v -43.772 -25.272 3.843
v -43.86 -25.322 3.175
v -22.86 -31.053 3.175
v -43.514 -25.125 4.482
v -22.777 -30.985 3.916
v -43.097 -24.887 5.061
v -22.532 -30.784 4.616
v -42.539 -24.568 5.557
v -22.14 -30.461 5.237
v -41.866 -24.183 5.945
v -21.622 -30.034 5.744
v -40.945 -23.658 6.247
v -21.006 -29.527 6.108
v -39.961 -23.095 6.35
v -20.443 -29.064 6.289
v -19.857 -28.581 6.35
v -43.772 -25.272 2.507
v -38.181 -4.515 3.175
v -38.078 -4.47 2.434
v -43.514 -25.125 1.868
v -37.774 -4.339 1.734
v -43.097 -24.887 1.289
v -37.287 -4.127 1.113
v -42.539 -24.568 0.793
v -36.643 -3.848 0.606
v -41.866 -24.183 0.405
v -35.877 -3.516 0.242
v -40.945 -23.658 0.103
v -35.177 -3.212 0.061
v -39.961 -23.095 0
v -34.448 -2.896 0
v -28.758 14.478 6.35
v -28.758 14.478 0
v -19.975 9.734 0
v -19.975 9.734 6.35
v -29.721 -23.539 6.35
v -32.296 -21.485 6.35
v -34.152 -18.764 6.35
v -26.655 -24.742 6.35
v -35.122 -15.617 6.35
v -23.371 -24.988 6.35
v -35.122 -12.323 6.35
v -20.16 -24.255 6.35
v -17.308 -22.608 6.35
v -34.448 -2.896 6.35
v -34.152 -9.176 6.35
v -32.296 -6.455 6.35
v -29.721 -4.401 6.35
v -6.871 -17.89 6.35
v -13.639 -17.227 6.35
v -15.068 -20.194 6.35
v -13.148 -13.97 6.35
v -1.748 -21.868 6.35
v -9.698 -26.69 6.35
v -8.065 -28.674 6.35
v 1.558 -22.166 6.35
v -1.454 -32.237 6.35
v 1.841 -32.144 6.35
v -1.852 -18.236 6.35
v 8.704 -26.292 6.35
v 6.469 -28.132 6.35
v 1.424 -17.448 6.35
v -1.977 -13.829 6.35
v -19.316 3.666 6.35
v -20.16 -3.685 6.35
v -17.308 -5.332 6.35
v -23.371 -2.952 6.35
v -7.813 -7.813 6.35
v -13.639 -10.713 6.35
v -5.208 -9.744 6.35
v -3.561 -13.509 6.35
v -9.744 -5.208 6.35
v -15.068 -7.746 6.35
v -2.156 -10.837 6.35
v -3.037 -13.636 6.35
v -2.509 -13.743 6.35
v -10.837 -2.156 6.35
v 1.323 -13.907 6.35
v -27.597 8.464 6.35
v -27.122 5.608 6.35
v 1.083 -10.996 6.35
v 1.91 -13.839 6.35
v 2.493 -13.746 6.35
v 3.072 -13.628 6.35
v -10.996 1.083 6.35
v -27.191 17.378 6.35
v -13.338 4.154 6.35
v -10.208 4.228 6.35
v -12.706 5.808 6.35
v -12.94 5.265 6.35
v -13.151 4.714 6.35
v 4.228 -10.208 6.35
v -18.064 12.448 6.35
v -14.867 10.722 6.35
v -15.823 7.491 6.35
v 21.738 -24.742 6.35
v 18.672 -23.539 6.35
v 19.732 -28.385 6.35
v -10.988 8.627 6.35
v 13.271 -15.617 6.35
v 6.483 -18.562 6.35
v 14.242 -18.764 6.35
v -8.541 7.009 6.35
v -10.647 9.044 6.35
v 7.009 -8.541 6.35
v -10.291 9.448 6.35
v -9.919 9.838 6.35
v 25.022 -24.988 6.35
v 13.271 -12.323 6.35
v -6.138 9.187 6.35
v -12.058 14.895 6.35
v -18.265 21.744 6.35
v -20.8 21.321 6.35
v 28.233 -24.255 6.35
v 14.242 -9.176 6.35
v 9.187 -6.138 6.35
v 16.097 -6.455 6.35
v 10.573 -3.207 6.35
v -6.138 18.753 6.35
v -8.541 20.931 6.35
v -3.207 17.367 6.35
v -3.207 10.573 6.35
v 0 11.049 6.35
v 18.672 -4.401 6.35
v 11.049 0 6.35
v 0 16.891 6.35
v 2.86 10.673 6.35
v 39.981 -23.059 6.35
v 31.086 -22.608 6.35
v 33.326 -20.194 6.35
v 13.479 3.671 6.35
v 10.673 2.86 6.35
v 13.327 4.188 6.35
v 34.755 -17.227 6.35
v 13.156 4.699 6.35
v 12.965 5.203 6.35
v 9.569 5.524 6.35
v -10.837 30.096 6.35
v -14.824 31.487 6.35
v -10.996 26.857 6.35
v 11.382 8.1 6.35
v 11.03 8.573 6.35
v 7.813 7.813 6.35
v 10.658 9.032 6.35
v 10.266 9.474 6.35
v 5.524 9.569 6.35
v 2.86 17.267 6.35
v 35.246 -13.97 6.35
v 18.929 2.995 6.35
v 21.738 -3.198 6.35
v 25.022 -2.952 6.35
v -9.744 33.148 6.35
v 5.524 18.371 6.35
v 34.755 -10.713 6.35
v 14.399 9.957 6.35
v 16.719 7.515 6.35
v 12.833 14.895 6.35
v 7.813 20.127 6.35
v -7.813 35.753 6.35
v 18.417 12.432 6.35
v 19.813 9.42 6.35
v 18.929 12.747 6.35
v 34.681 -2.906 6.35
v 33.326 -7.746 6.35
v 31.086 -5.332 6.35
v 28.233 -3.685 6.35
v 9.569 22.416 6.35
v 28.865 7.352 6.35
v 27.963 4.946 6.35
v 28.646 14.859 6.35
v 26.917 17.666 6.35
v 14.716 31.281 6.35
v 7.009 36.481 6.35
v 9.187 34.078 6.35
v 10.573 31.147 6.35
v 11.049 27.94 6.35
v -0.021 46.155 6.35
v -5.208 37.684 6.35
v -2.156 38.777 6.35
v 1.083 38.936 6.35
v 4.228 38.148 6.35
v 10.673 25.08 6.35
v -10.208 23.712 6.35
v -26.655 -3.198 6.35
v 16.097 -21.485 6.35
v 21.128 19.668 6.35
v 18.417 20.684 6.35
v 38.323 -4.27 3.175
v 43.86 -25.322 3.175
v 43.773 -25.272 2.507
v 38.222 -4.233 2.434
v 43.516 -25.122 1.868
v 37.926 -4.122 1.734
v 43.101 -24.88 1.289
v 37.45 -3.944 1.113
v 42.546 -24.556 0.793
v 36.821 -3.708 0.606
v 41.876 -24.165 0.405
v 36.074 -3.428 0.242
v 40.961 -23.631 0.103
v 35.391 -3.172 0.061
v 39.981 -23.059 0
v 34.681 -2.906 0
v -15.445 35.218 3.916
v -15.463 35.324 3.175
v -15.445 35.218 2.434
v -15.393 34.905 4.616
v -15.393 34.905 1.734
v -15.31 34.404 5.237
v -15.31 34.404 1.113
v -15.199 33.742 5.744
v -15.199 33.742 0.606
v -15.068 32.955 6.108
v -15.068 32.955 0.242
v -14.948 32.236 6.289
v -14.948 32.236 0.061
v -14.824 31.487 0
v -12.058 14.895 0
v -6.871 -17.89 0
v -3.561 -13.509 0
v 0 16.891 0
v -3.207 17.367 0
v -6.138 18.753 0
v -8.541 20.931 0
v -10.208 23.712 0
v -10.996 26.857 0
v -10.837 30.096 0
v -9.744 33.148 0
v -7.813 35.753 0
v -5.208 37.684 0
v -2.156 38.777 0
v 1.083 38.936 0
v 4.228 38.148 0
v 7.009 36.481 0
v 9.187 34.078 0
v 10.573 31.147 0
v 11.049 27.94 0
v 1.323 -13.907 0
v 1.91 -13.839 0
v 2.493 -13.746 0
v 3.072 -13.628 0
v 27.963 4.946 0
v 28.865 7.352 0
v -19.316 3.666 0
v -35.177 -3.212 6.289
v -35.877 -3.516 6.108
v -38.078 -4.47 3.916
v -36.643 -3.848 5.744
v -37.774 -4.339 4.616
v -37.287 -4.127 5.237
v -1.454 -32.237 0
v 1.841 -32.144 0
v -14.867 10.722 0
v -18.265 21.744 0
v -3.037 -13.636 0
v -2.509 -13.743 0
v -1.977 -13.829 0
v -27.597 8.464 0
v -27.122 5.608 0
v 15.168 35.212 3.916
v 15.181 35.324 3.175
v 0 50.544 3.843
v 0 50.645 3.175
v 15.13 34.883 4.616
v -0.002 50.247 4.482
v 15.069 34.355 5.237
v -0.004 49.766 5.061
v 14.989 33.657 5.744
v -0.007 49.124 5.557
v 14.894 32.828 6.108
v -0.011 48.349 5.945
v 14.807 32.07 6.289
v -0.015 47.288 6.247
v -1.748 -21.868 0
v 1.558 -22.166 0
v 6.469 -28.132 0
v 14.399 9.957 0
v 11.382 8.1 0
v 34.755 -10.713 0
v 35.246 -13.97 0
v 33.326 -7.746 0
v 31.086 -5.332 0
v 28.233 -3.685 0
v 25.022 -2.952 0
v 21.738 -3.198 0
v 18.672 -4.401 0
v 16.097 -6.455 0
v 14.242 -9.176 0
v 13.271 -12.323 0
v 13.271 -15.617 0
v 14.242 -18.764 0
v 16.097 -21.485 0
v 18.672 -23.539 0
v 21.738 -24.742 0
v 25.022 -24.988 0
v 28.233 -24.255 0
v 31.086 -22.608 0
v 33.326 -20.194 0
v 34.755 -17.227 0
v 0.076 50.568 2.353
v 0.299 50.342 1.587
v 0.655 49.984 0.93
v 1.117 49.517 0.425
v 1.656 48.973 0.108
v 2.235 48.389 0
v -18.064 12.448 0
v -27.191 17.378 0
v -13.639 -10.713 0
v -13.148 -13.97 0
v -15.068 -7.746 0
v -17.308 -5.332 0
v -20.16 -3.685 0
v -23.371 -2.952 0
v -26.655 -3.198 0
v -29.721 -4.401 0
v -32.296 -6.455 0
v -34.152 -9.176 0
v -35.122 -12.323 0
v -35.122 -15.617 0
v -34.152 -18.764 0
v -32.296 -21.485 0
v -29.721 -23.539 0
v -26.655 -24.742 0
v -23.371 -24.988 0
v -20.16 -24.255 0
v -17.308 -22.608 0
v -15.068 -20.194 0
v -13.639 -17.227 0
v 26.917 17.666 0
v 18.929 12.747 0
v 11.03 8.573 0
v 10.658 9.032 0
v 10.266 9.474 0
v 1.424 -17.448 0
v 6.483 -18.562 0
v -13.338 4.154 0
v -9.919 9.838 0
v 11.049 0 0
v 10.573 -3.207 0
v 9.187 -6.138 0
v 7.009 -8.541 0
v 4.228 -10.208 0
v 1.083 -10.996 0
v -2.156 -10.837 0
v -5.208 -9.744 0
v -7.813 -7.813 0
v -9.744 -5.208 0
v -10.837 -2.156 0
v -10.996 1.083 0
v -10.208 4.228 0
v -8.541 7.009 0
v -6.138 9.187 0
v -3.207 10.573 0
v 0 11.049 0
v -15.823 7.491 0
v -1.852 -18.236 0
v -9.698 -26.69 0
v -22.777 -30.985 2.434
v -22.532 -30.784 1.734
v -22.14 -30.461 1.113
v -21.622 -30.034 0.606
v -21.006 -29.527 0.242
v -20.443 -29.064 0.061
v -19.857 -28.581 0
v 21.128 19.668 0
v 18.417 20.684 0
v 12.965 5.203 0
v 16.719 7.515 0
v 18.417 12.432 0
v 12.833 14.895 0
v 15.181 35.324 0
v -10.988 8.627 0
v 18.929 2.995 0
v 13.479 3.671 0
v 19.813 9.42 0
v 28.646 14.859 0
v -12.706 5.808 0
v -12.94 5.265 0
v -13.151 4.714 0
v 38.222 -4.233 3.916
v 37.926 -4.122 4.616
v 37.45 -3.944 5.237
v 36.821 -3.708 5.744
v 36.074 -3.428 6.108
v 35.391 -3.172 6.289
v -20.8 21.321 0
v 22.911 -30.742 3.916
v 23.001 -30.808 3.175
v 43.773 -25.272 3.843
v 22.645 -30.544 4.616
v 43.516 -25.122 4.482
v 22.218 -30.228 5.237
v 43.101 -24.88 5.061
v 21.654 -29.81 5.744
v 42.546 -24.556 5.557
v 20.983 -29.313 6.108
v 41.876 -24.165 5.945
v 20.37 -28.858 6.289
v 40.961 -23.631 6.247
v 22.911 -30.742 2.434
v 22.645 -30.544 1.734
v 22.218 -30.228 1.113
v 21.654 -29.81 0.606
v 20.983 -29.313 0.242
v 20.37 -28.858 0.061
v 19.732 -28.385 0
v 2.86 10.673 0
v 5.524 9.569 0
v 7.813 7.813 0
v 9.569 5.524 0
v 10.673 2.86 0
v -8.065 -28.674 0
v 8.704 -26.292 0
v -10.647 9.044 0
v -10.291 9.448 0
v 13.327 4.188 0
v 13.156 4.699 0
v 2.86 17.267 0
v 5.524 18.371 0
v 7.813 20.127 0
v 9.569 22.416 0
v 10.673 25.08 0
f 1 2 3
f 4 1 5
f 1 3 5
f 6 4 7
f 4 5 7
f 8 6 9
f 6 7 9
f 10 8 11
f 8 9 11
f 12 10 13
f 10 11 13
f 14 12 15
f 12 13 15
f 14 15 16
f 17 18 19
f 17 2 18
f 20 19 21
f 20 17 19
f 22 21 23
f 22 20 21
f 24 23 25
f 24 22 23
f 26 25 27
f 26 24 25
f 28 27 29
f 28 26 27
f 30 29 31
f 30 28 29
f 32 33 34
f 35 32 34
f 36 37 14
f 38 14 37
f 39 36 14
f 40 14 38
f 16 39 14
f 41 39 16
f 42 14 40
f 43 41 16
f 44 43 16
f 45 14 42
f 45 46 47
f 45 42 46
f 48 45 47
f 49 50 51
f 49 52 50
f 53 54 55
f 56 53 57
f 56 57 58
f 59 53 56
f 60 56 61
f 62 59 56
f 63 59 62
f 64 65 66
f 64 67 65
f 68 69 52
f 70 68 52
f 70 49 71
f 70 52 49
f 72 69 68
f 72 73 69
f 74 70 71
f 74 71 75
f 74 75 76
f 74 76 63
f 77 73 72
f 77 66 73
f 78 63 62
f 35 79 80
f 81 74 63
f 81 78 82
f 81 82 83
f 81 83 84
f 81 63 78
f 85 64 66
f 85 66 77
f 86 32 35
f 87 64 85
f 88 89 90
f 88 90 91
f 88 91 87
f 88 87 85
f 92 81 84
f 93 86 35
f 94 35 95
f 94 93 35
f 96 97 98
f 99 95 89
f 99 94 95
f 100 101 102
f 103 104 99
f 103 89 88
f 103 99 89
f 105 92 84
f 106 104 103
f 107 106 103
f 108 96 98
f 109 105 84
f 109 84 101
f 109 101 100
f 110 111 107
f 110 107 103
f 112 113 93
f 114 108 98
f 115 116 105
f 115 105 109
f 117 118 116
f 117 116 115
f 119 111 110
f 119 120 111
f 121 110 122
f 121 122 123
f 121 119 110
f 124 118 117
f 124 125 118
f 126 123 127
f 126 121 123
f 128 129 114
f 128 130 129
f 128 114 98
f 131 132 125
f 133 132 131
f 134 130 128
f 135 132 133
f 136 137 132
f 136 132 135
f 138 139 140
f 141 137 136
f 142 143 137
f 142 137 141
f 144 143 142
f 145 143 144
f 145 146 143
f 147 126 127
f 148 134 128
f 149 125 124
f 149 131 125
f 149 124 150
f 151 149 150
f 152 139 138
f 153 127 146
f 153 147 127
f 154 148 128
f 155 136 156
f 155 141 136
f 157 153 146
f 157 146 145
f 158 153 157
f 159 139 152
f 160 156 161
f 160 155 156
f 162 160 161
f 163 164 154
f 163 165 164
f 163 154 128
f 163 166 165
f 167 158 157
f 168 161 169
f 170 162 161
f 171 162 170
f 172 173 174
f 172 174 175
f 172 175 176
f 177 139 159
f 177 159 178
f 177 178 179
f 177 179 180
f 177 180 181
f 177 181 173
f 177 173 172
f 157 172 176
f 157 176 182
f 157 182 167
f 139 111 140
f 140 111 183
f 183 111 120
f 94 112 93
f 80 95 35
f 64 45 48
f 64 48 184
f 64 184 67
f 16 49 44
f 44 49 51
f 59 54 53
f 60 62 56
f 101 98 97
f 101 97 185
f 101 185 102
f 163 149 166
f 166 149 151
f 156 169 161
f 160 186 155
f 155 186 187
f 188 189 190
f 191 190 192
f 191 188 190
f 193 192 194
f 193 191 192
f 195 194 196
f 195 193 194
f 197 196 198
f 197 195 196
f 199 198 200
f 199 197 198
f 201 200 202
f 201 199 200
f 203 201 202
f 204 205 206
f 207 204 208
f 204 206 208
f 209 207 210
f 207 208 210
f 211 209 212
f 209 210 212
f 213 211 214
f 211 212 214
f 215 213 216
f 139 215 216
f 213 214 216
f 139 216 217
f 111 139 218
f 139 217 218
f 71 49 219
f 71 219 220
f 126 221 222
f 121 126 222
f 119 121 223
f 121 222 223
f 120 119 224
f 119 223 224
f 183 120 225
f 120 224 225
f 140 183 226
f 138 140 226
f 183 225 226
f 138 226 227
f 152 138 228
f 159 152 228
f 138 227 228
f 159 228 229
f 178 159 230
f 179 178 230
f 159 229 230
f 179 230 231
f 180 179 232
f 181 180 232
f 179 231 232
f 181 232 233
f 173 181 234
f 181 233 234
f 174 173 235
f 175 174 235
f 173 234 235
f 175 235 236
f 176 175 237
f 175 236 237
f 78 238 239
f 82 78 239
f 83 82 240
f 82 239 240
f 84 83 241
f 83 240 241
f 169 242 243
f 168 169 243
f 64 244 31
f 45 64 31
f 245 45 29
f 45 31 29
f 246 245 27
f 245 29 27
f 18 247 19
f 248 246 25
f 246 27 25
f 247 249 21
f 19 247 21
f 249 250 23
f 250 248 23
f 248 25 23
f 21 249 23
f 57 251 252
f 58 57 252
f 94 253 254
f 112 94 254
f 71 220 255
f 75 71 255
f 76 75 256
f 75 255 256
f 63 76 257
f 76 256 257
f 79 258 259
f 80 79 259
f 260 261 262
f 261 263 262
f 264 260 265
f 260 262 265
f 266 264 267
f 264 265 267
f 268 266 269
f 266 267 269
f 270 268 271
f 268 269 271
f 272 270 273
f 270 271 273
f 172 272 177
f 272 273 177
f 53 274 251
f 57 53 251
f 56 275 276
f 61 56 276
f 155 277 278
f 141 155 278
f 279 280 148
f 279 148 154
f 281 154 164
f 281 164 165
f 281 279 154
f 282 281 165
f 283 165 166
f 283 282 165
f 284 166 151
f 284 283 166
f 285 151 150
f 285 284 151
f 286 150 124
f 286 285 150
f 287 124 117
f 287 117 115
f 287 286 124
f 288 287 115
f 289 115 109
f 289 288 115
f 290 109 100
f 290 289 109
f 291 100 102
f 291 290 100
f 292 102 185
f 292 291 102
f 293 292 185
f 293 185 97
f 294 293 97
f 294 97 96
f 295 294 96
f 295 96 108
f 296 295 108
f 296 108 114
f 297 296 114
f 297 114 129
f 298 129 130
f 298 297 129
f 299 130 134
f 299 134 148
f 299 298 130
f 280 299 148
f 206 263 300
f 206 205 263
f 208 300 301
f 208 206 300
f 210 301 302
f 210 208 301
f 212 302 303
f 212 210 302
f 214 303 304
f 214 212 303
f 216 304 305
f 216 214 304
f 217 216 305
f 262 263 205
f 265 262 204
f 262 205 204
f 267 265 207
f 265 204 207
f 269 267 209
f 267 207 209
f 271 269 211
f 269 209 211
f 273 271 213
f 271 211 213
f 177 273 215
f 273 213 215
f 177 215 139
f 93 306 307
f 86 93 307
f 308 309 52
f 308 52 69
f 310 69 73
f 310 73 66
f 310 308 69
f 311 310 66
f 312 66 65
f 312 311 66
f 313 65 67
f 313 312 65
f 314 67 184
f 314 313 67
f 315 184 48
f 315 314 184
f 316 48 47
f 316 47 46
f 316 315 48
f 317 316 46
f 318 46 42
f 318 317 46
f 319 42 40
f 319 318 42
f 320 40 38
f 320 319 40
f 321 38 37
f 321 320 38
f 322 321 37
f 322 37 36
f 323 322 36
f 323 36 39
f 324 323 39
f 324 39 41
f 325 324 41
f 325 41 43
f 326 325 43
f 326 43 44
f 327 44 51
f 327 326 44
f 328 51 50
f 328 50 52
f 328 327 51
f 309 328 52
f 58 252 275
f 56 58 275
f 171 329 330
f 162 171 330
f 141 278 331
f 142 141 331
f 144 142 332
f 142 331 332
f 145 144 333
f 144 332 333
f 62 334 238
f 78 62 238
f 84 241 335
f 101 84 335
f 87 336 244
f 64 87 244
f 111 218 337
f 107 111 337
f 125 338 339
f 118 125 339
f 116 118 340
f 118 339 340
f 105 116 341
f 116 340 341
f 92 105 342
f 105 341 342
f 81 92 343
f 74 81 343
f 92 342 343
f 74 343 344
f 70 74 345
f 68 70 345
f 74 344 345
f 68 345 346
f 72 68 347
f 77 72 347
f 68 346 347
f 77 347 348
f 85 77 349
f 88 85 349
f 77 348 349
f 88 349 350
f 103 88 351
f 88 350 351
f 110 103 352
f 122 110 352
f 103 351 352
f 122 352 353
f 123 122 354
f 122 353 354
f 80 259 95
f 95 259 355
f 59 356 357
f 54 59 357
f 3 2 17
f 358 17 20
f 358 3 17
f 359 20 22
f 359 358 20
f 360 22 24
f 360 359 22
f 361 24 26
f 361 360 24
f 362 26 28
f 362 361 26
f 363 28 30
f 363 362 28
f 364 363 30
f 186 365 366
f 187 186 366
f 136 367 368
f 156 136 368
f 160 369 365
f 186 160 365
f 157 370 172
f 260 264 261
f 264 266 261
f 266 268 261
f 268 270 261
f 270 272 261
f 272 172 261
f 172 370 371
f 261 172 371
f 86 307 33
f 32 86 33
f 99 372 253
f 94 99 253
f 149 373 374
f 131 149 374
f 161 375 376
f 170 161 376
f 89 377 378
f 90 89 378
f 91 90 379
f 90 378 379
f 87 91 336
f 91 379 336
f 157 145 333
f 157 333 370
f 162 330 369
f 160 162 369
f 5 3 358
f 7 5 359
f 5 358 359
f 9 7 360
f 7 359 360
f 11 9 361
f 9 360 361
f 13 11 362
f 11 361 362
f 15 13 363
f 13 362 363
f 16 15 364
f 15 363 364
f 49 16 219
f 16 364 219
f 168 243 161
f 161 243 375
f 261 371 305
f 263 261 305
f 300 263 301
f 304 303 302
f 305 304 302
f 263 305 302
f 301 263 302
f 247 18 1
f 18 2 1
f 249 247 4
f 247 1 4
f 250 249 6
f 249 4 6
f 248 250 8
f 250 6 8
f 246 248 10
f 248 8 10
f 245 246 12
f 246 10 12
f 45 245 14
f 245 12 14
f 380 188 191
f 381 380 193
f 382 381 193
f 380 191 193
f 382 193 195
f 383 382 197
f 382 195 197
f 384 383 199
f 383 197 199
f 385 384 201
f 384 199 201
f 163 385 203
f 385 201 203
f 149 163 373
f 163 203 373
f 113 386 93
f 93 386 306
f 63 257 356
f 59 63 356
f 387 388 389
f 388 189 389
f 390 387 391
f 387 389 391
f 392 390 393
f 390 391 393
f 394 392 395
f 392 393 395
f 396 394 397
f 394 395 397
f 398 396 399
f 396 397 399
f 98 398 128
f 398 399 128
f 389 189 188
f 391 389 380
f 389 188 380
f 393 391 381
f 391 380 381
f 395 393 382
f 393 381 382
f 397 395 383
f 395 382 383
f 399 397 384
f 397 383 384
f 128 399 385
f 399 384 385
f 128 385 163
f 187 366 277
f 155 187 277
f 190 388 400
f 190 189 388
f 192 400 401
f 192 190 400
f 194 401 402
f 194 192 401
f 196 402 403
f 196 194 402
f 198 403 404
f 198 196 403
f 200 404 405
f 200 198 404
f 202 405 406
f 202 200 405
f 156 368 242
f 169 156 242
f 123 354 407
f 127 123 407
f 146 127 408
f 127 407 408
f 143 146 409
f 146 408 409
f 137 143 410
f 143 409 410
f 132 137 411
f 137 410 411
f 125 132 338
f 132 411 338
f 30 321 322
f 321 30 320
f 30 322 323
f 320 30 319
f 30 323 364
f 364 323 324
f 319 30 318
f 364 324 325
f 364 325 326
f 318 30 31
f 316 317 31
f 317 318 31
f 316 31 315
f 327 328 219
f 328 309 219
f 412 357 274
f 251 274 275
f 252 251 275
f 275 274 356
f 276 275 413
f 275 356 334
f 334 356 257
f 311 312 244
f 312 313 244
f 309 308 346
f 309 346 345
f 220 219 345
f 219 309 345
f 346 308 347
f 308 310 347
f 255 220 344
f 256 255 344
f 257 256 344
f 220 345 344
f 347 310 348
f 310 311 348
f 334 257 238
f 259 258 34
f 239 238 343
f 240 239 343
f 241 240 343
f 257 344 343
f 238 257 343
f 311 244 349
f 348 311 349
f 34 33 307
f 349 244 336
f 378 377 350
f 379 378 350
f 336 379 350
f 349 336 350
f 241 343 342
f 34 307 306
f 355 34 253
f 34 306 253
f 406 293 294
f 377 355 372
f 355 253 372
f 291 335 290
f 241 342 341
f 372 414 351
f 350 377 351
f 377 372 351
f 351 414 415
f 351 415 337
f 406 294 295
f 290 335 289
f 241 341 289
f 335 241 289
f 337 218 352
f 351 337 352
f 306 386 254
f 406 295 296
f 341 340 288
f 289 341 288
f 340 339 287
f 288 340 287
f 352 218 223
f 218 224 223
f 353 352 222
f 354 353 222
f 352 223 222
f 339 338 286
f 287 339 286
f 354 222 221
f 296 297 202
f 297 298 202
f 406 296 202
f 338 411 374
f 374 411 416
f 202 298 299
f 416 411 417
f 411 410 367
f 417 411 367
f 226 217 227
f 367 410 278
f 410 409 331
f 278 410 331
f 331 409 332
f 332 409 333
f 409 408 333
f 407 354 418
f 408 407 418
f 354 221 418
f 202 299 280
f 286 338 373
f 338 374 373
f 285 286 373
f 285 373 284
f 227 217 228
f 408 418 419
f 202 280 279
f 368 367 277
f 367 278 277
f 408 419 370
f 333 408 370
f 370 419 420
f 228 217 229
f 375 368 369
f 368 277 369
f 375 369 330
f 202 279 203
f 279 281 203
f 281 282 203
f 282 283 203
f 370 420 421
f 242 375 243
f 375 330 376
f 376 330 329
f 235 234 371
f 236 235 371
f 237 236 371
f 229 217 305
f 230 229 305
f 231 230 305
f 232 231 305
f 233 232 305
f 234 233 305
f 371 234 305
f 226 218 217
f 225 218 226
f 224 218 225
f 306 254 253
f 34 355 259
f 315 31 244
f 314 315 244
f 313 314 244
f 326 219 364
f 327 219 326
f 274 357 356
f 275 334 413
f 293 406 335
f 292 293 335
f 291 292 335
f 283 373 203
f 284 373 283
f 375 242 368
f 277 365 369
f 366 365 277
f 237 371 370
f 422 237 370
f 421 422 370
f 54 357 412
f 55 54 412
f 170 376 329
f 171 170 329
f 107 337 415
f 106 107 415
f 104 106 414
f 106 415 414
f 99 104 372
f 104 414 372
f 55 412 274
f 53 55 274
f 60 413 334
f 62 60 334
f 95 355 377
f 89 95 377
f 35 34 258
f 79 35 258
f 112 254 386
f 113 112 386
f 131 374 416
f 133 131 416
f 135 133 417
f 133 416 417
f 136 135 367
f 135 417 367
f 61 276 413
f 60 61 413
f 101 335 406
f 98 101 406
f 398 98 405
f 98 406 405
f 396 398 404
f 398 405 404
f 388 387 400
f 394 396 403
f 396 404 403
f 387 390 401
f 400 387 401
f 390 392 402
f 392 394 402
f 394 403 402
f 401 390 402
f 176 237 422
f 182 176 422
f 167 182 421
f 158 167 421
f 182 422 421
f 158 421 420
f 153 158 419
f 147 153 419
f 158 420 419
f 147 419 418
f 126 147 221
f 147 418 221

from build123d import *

# Parameters (mm, degrees)
F0_R     = 11.049
F1_DEPTH = 6.35
F2_R     = 3.17499


# Not quite as in the source:
# - a fillet or chamfer is up to 0.001 mm smaller than in the source, because OpenCascade refuses the exact size


with BuildPart() as f1:
    # F0 (on Top) → F1 (new body)
    with BuildSketch(Plane.XY):
        with BuildLine():
            ThreePointArc((10.266368543, 9.474311423), (5.6037830713, 12.7968166076), (0, 13.97))
            ThreePointArc((0, 13.97), (-5.3724040771, 12.8956649473), (-9.9185000629, 9.8378989882))
            ThreePointArc((-9.9185000629, 9.8378989882), (-10.4709665549, 9.247689409), (-10.9883672437, 8.6265106107))
            Line((-10.9883672437, 8.6265106107), (-14.8673558727, 10.7216511471))
            Line((-14.8673558727, 10.7216511471), (-18.2652639065, 21.743875915))
            Line((-18.2652639065, 21.743875915), (-20.7996486885, 21.3214784899))
            Line((-20.7996486885, 21.3214784899), (-18.0642706589, 12.4483862321))
            Line((-18.0642706589, 12.4483862321), (-27.1912532422, 17.3781019425))
            Line((-27.1912532422, 17.3781019425), (-28.7577700617, 14.4778187277))
            Line((-28.7577700617, 14.4778187277), (-19.9750544664, 9.7340503842))
            Line((-19.9750544664, 9.7340503842), (-27.5974388749, 8.4636530986))
            Line((-27.5974388749, 8.4636530986), (-27.1215043395, 5.6080456262))
            Line((-27.1215043395, 5.6080456262), (-15.8225889535, 7.4911980188))
            Line((-15.8225889535, 7.4911980188), (-12.7056009028, 5.8076333991))
            ThreePointArc((-12.7056009028, 5.8076333991), (-13.0481194381, 4.9907393369), (-13.3381786472, 4.1537802513))
            ThreePointArc((-13.3381786472, 4.1537802513), (-12.2222121685, -6.7659758874), (-3.5606204122, -13.508622516))
            ThreePointArc((-3.5606204122, -13.508622516), (-2.773250677, -13.6919677433), (-1.9765937131, -13.8294604845))
            Line((-1.9765937131, -13.8294604845), (-1.8515443275, -18.2363334465))
            Line((-1.8515443275, -18.2363334465), (-9.6981169659, -26.6901205073))
            Line((-9.6981169659, -26.6901205073), (-8.0651176742, -28.6737633989))
            Line((-8.0651176742, -28.6737633989), (-1.7484833836, -21.8683104075))
            Line((-1.7484833836, -21.8683104075), (-1.4542511306, -32.2373670397))
            Line((-1.4542511306, -32.2373670397), (1.8407262213, -32.1438687935))
            Line((1.8407262213, -32.1438687935), (1.5575923187, -22.165929802))
            Line((1.5575923187, -22.165929802), (6.4689808452, -28.1319096943))
            Line((6.4689808452, -28.1319096943), (8.7040421919, -26.29193456))
            Line((8.7040421919, -26.29193456), (1.4237266877, -17.4483629968))
            Line((1.4237266877, -17.4483629968), (1.323242392, -13.9071898517))
            ThreePointArc((1.323242392, -13.9071898517), (2.2019526696, -13.7953725735), (3.0718101042, -13.6280916743))
            ThreePointArc((3.0718101042, -13.6280916743), (11.9706130841, -7.2017582846), (13.4791204751, 3.6707235278))
            ThreePointArc((13.4791204751, 3.6707235278), (13.244217232, 4.4442783342), (12.9649609568, 5.2029498738))
            Line((12.9649609568, 5.2029498738), (16.7189002003, 7.5146822993))
            Line((16.7189002003, 7.5146822993), (27.9633808724, 4.9462445923))
            Line((27.9633808724, 4.9462445923), (28.8647663627, 7.3522849091))
            Line((28.8647663627, 7.3522849091), (19.8127540426, 9.4199241754))
            Line((19.8127540426, 9.4199241754), (28.6455043728, 14.8592650972))
            Line((28.6455043728, 14.8592650972), (26.9170438404, 17.6660500658))
            Line((26.9170438404, 17.6660500658), (18.9289850868, 12.7468829615))
            Line((18.9289850868, 12.7468829615), (18.4174621476, 12.4318794178))
            Line((18.4174621476, 12.4318794178), (21.1284580297, 19.6682565957))
            Line((21.1284580297, 19.6682565957), (18.4174621476, 20.6838889338))
            Line((18.4174621476, 20.6838889338), (14.3988622659, 9.957164978))
            Line((14.3988622659, 9.957164978), (11.3823585109, 8.0995564527))
            ThreePointArc((11.3823585109, 8.0995564527), (10.8461667685, 8.8046332365), (10.266368543, 9.474311423))
        make_face()
        with BuildLine():
            ThreePointArc((0, 11.049), (7.8128228253, 7.8128228253), (11.049, 0))
            ThreePointArc((11.049, 0), (-7.8128228253, -7.8128228253), (0, 11.049))
        make_face(mode=Mode.SUBTRACT)
        with BuildLine():
            ThreePointArc((-9.9185000629, 9.8378989882), (-5.3724040771, 12.8956649473), (0, 13.97))
            ThreePointArc((0, 13.97), (5.6037830713, 12.7968166076), (10.266368543, 9.474311423))
            Line((10.266368543, 9.474311423), (12.8332442979, 14.8954782635))
            Line((12.8332442979, 14.8954782635), (15.1805052923, 35.3235639632))
            Line((15.1805052923, 35.3235639632), (0, 50.6446287036))
            Line((0, 50.6446287036), (-15.4629256576, 35.3235639632))
            Line((-15.4629256576, 35.3235639632), (-12.0582450181, 14.8954782635))
            Line((-12.0582450181, 14.8954782635), (-9.9185000629, 9.8378989882))
        make_face()
        with BuildLine():
            ThreePointArc((11.049, 27.94), (7.8128228253, 20.1271771747), (0, 16.891))
            ThreePointArc((0, 16.891), (-7.8128228253, 35.7528228253), (11.049, 27.94))
        make_face(mode=Mode.SUBTRACT)
        with BuildLine():
            ThreePointArc((-3.5606204122, -13.508622516), (-12.2222121685, -6.7659758874), (-13.3381786472, 4.1537802513))
            Line((-13.3381786472, 4.1537802513), (-19.3164847266, 3.6661764432))
            Line((-19.3164847266, 3.6661764432), (-38.1813563905, -4.5150787562))
            Line((-38.1813563905, -4.5150787562), (-43.8595350225, -25.3223143518))
            Line((-43.8595350225, -25.3223143518), (-22.8596409155, -31.0530684179))
            Line((-22.8596409155, -31.0530684179), (-6.8707400686, -17.8904856425))
            Line((-6.8707400686, -17.8904856425), (-3.5606204122, -13.508622516))
        make_face()
        with Locations((-24.1967497817, -13.97)):
            Circle(F0_R, mode=Mode.SUBTRACT)
        with BuildLine():
            Line((18.9289850868, 2.995007379), (13.4791204751, 3.6707235278))
            ThreePointArc((13.4791204751, 3.6707235278), (11.9706130841, -7.2017582846), (3.0718101042, -13.6280916743))
            Line((3.0718101042, -13.6280916743), (6.4832404288, -18.5616547067))
            Line((6.4832404288, -18.5616547067), (23.0008510982, -30.808485207))
            Line((23.0008510982, -30.808485207), (43.8595350225, -25.3223143518))
            Line((43.8595350225, -25.3223143518), (38.3225665731, -4.2704955452))
            Line((38.3225665731, -4.2704955452), (18.9289850868, 2.995007379))
        make_face()
        with Locations((24.1967497817, -13.97)):
            Circle(F0_R, mode=Mode.SUBTRACT)
    extrude(amount=F1_DEPTH)

    # F2 (radius 3.175 in the source; OpenCascade refuses exactly that, so slightly less here)
    f2_edges = [f1.edges().sort_by_distance(p)[0] for p in [
        (-7.731463, 42.984096, 6.35),
        (7.590253, 42.984096, 6.35),
        (41.091051, -14.796405, 6.35),
        (33.430193, -28.0654, 6.35),
        (-41.020446, -14.918697, 6.35),
        (-33.359588, -28.187691, 6.35),
        (-33.359588, -28.187691, 0),
        (-41.020446, -14.918697, 0),
        (-7.731463, 42.984096, 0),
        (41.091051, -14.796405, 0),
        (33.430193, -28.0654, 0),
    ]]
    fillet(f2_edges, radius=F2_R)


solid = f1.part
